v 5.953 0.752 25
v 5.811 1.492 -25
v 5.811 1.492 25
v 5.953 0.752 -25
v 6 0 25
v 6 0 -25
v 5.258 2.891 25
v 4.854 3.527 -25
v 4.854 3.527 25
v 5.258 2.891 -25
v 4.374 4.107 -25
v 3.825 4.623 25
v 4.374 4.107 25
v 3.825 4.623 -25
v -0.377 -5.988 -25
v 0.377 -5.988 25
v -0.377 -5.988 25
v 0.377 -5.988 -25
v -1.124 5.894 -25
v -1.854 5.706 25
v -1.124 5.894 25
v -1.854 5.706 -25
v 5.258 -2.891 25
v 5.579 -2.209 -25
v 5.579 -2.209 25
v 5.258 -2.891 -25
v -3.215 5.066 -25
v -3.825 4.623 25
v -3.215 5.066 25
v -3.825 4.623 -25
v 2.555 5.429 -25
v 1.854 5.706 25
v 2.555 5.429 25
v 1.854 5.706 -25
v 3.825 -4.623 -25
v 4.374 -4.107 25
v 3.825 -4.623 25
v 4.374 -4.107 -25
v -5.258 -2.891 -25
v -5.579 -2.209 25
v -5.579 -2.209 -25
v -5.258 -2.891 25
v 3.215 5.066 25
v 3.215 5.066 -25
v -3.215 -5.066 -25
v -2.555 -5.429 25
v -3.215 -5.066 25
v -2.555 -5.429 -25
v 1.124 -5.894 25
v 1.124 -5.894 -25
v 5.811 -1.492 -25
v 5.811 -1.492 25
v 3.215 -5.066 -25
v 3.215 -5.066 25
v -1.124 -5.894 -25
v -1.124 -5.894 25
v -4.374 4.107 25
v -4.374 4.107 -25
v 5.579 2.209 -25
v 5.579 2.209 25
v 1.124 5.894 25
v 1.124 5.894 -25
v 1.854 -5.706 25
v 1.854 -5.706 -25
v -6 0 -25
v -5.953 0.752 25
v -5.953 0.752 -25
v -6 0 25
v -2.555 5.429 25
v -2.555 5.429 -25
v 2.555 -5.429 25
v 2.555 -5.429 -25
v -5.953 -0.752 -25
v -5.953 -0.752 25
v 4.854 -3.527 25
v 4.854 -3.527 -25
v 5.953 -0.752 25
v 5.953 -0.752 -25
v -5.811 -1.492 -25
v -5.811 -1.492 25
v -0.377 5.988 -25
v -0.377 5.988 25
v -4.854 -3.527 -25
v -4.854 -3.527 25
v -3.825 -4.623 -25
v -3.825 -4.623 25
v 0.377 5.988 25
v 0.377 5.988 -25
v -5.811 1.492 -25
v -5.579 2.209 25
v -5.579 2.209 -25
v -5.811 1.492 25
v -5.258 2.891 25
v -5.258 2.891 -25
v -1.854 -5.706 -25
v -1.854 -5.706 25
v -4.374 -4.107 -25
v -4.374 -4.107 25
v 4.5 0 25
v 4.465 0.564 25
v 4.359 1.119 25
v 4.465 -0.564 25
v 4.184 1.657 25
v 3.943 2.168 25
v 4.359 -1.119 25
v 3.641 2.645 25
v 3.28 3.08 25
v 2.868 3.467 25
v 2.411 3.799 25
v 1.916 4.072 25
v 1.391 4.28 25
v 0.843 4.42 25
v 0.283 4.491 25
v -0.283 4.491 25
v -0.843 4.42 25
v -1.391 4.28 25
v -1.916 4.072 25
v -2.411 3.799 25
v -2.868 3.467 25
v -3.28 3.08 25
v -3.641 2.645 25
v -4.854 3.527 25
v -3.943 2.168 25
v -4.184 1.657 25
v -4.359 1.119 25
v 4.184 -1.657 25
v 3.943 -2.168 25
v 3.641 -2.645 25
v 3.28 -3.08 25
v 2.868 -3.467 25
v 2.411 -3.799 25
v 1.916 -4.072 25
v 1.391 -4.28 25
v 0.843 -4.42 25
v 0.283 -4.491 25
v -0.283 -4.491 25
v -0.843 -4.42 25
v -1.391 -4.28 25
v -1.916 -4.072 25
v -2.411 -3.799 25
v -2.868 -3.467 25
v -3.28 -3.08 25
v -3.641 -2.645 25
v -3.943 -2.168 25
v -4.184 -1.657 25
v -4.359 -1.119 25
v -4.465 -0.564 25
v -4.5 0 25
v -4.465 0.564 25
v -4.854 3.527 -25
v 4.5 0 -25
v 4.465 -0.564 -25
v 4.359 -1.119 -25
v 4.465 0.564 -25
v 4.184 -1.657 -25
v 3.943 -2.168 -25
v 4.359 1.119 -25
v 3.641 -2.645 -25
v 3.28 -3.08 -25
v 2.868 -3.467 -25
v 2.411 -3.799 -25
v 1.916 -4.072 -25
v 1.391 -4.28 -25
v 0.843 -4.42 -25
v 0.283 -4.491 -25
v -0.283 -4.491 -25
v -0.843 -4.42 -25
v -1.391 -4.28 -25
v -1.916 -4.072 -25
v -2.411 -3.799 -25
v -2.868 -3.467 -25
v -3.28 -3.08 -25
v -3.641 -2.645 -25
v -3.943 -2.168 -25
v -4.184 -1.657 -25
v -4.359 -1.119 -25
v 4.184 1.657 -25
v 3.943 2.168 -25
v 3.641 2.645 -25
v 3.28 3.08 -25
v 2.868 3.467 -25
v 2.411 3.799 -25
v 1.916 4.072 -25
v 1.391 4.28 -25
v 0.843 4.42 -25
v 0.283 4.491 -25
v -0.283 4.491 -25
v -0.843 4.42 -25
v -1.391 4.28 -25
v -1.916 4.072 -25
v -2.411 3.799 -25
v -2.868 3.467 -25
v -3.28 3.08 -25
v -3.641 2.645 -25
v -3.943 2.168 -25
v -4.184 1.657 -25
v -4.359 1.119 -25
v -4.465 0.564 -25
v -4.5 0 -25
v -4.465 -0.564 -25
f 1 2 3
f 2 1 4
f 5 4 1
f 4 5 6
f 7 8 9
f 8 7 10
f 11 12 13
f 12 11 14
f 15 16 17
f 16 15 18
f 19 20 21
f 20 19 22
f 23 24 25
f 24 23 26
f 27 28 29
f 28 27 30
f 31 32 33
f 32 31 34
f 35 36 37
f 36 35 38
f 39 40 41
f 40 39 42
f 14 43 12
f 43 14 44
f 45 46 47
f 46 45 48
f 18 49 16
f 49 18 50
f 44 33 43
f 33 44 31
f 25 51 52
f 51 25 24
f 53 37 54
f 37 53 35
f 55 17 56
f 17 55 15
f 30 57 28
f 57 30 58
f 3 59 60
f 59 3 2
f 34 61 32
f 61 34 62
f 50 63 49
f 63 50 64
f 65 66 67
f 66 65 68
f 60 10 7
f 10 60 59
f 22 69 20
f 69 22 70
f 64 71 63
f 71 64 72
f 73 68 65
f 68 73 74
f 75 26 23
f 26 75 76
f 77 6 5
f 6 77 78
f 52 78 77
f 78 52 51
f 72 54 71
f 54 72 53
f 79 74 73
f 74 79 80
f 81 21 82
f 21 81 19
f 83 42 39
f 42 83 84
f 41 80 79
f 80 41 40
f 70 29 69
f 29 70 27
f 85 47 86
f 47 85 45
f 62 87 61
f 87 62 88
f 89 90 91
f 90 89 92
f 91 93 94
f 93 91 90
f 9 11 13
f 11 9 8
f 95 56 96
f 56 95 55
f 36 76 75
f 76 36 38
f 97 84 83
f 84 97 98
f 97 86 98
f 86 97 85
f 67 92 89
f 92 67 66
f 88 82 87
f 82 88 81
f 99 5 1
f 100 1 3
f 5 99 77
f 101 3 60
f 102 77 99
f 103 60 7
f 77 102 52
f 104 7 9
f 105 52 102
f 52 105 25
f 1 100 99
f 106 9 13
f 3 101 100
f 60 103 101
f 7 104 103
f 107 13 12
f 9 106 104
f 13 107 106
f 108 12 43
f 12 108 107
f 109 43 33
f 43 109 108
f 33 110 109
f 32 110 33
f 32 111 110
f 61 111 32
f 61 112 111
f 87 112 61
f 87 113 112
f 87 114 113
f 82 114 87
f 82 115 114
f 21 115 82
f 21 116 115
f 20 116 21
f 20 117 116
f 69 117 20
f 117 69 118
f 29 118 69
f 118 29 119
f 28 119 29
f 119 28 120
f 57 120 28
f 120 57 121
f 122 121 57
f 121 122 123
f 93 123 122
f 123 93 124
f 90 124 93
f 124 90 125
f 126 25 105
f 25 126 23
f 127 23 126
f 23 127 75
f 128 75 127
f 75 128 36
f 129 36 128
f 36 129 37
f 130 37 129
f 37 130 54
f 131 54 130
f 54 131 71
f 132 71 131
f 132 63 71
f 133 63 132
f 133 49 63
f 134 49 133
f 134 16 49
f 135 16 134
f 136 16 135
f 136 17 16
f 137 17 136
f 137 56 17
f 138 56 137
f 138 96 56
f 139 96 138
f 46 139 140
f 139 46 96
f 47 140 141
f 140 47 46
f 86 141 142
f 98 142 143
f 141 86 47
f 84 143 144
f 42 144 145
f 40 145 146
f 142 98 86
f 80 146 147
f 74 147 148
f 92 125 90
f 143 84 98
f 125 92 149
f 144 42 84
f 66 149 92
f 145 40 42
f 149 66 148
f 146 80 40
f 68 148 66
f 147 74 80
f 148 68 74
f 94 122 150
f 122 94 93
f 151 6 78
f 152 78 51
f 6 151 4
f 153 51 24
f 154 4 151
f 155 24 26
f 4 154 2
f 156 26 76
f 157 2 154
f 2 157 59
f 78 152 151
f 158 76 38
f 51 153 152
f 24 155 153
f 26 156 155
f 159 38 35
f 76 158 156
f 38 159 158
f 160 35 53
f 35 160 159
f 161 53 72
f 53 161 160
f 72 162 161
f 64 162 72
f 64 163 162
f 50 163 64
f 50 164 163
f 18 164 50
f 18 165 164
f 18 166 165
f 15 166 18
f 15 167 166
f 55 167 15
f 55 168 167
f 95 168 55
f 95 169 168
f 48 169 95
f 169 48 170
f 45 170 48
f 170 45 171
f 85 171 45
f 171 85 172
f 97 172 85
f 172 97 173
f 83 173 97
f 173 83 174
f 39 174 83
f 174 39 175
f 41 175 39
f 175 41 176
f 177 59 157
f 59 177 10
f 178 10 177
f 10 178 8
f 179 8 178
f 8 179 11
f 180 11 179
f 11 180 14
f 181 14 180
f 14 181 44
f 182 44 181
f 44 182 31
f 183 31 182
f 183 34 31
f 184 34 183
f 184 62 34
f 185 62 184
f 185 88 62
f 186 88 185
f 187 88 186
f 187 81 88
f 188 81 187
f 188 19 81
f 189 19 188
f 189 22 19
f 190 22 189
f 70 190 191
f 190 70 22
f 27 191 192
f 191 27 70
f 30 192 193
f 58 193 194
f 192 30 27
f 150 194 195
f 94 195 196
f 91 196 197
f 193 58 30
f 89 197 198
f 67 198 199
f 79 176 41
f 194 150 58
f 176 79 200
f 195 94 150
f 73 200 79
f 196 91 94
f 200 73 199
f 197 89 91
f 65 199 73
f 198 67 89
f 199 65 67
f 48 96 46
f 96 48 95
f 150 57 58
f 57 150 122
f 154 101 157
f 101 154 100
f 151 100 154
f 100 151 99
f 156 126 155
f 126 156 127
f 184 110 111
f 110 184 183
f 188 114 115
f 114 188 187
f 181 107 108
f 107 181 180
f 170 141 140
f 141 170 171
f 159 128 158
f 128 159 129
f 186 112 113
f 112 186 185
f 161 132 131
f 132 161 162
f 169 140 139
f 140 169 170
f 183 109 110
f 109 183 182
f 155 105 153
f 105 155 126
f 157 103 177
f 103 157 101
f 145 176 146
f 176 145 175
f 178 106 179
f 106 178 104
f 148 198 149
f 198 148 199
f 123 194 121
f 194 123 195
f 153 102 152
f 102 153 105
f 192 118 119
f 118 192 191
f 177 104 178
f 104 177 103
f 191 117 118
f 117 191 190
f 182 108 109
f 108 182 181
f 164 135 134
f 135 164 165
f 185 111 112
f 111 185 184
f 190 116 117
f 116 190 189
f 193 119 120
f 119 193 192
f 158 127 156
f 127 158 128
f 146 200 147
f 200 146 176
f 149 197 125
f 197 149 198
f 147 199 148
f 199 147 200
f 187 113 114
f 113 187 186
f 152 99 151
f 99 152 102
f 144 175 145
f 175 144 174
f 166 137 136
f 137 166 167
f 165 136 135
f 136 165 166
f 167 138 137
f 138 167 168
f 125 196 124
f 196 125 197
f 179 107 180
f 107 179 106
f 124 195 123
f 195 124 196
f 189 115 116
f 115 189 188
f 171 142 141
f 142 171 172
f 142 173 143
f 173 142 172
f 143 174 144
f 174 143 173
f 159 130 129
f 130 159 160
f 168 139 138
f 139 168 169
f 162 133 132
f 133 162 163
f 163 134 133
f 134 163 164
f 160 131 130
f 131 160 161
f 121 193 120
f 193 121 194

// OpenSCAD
$fn = 50;


difference() {
	union() {
		translate(v = [0, 0, -25.0000000000]) {
			cylinder(h = 50, r = 6.0000000000);
		}
	}
	union() {
		translate(v = [0, 0, -100.0000000000]) {
			cylinder(h = 200, r = 4.5000000000);
		}
	}
}
